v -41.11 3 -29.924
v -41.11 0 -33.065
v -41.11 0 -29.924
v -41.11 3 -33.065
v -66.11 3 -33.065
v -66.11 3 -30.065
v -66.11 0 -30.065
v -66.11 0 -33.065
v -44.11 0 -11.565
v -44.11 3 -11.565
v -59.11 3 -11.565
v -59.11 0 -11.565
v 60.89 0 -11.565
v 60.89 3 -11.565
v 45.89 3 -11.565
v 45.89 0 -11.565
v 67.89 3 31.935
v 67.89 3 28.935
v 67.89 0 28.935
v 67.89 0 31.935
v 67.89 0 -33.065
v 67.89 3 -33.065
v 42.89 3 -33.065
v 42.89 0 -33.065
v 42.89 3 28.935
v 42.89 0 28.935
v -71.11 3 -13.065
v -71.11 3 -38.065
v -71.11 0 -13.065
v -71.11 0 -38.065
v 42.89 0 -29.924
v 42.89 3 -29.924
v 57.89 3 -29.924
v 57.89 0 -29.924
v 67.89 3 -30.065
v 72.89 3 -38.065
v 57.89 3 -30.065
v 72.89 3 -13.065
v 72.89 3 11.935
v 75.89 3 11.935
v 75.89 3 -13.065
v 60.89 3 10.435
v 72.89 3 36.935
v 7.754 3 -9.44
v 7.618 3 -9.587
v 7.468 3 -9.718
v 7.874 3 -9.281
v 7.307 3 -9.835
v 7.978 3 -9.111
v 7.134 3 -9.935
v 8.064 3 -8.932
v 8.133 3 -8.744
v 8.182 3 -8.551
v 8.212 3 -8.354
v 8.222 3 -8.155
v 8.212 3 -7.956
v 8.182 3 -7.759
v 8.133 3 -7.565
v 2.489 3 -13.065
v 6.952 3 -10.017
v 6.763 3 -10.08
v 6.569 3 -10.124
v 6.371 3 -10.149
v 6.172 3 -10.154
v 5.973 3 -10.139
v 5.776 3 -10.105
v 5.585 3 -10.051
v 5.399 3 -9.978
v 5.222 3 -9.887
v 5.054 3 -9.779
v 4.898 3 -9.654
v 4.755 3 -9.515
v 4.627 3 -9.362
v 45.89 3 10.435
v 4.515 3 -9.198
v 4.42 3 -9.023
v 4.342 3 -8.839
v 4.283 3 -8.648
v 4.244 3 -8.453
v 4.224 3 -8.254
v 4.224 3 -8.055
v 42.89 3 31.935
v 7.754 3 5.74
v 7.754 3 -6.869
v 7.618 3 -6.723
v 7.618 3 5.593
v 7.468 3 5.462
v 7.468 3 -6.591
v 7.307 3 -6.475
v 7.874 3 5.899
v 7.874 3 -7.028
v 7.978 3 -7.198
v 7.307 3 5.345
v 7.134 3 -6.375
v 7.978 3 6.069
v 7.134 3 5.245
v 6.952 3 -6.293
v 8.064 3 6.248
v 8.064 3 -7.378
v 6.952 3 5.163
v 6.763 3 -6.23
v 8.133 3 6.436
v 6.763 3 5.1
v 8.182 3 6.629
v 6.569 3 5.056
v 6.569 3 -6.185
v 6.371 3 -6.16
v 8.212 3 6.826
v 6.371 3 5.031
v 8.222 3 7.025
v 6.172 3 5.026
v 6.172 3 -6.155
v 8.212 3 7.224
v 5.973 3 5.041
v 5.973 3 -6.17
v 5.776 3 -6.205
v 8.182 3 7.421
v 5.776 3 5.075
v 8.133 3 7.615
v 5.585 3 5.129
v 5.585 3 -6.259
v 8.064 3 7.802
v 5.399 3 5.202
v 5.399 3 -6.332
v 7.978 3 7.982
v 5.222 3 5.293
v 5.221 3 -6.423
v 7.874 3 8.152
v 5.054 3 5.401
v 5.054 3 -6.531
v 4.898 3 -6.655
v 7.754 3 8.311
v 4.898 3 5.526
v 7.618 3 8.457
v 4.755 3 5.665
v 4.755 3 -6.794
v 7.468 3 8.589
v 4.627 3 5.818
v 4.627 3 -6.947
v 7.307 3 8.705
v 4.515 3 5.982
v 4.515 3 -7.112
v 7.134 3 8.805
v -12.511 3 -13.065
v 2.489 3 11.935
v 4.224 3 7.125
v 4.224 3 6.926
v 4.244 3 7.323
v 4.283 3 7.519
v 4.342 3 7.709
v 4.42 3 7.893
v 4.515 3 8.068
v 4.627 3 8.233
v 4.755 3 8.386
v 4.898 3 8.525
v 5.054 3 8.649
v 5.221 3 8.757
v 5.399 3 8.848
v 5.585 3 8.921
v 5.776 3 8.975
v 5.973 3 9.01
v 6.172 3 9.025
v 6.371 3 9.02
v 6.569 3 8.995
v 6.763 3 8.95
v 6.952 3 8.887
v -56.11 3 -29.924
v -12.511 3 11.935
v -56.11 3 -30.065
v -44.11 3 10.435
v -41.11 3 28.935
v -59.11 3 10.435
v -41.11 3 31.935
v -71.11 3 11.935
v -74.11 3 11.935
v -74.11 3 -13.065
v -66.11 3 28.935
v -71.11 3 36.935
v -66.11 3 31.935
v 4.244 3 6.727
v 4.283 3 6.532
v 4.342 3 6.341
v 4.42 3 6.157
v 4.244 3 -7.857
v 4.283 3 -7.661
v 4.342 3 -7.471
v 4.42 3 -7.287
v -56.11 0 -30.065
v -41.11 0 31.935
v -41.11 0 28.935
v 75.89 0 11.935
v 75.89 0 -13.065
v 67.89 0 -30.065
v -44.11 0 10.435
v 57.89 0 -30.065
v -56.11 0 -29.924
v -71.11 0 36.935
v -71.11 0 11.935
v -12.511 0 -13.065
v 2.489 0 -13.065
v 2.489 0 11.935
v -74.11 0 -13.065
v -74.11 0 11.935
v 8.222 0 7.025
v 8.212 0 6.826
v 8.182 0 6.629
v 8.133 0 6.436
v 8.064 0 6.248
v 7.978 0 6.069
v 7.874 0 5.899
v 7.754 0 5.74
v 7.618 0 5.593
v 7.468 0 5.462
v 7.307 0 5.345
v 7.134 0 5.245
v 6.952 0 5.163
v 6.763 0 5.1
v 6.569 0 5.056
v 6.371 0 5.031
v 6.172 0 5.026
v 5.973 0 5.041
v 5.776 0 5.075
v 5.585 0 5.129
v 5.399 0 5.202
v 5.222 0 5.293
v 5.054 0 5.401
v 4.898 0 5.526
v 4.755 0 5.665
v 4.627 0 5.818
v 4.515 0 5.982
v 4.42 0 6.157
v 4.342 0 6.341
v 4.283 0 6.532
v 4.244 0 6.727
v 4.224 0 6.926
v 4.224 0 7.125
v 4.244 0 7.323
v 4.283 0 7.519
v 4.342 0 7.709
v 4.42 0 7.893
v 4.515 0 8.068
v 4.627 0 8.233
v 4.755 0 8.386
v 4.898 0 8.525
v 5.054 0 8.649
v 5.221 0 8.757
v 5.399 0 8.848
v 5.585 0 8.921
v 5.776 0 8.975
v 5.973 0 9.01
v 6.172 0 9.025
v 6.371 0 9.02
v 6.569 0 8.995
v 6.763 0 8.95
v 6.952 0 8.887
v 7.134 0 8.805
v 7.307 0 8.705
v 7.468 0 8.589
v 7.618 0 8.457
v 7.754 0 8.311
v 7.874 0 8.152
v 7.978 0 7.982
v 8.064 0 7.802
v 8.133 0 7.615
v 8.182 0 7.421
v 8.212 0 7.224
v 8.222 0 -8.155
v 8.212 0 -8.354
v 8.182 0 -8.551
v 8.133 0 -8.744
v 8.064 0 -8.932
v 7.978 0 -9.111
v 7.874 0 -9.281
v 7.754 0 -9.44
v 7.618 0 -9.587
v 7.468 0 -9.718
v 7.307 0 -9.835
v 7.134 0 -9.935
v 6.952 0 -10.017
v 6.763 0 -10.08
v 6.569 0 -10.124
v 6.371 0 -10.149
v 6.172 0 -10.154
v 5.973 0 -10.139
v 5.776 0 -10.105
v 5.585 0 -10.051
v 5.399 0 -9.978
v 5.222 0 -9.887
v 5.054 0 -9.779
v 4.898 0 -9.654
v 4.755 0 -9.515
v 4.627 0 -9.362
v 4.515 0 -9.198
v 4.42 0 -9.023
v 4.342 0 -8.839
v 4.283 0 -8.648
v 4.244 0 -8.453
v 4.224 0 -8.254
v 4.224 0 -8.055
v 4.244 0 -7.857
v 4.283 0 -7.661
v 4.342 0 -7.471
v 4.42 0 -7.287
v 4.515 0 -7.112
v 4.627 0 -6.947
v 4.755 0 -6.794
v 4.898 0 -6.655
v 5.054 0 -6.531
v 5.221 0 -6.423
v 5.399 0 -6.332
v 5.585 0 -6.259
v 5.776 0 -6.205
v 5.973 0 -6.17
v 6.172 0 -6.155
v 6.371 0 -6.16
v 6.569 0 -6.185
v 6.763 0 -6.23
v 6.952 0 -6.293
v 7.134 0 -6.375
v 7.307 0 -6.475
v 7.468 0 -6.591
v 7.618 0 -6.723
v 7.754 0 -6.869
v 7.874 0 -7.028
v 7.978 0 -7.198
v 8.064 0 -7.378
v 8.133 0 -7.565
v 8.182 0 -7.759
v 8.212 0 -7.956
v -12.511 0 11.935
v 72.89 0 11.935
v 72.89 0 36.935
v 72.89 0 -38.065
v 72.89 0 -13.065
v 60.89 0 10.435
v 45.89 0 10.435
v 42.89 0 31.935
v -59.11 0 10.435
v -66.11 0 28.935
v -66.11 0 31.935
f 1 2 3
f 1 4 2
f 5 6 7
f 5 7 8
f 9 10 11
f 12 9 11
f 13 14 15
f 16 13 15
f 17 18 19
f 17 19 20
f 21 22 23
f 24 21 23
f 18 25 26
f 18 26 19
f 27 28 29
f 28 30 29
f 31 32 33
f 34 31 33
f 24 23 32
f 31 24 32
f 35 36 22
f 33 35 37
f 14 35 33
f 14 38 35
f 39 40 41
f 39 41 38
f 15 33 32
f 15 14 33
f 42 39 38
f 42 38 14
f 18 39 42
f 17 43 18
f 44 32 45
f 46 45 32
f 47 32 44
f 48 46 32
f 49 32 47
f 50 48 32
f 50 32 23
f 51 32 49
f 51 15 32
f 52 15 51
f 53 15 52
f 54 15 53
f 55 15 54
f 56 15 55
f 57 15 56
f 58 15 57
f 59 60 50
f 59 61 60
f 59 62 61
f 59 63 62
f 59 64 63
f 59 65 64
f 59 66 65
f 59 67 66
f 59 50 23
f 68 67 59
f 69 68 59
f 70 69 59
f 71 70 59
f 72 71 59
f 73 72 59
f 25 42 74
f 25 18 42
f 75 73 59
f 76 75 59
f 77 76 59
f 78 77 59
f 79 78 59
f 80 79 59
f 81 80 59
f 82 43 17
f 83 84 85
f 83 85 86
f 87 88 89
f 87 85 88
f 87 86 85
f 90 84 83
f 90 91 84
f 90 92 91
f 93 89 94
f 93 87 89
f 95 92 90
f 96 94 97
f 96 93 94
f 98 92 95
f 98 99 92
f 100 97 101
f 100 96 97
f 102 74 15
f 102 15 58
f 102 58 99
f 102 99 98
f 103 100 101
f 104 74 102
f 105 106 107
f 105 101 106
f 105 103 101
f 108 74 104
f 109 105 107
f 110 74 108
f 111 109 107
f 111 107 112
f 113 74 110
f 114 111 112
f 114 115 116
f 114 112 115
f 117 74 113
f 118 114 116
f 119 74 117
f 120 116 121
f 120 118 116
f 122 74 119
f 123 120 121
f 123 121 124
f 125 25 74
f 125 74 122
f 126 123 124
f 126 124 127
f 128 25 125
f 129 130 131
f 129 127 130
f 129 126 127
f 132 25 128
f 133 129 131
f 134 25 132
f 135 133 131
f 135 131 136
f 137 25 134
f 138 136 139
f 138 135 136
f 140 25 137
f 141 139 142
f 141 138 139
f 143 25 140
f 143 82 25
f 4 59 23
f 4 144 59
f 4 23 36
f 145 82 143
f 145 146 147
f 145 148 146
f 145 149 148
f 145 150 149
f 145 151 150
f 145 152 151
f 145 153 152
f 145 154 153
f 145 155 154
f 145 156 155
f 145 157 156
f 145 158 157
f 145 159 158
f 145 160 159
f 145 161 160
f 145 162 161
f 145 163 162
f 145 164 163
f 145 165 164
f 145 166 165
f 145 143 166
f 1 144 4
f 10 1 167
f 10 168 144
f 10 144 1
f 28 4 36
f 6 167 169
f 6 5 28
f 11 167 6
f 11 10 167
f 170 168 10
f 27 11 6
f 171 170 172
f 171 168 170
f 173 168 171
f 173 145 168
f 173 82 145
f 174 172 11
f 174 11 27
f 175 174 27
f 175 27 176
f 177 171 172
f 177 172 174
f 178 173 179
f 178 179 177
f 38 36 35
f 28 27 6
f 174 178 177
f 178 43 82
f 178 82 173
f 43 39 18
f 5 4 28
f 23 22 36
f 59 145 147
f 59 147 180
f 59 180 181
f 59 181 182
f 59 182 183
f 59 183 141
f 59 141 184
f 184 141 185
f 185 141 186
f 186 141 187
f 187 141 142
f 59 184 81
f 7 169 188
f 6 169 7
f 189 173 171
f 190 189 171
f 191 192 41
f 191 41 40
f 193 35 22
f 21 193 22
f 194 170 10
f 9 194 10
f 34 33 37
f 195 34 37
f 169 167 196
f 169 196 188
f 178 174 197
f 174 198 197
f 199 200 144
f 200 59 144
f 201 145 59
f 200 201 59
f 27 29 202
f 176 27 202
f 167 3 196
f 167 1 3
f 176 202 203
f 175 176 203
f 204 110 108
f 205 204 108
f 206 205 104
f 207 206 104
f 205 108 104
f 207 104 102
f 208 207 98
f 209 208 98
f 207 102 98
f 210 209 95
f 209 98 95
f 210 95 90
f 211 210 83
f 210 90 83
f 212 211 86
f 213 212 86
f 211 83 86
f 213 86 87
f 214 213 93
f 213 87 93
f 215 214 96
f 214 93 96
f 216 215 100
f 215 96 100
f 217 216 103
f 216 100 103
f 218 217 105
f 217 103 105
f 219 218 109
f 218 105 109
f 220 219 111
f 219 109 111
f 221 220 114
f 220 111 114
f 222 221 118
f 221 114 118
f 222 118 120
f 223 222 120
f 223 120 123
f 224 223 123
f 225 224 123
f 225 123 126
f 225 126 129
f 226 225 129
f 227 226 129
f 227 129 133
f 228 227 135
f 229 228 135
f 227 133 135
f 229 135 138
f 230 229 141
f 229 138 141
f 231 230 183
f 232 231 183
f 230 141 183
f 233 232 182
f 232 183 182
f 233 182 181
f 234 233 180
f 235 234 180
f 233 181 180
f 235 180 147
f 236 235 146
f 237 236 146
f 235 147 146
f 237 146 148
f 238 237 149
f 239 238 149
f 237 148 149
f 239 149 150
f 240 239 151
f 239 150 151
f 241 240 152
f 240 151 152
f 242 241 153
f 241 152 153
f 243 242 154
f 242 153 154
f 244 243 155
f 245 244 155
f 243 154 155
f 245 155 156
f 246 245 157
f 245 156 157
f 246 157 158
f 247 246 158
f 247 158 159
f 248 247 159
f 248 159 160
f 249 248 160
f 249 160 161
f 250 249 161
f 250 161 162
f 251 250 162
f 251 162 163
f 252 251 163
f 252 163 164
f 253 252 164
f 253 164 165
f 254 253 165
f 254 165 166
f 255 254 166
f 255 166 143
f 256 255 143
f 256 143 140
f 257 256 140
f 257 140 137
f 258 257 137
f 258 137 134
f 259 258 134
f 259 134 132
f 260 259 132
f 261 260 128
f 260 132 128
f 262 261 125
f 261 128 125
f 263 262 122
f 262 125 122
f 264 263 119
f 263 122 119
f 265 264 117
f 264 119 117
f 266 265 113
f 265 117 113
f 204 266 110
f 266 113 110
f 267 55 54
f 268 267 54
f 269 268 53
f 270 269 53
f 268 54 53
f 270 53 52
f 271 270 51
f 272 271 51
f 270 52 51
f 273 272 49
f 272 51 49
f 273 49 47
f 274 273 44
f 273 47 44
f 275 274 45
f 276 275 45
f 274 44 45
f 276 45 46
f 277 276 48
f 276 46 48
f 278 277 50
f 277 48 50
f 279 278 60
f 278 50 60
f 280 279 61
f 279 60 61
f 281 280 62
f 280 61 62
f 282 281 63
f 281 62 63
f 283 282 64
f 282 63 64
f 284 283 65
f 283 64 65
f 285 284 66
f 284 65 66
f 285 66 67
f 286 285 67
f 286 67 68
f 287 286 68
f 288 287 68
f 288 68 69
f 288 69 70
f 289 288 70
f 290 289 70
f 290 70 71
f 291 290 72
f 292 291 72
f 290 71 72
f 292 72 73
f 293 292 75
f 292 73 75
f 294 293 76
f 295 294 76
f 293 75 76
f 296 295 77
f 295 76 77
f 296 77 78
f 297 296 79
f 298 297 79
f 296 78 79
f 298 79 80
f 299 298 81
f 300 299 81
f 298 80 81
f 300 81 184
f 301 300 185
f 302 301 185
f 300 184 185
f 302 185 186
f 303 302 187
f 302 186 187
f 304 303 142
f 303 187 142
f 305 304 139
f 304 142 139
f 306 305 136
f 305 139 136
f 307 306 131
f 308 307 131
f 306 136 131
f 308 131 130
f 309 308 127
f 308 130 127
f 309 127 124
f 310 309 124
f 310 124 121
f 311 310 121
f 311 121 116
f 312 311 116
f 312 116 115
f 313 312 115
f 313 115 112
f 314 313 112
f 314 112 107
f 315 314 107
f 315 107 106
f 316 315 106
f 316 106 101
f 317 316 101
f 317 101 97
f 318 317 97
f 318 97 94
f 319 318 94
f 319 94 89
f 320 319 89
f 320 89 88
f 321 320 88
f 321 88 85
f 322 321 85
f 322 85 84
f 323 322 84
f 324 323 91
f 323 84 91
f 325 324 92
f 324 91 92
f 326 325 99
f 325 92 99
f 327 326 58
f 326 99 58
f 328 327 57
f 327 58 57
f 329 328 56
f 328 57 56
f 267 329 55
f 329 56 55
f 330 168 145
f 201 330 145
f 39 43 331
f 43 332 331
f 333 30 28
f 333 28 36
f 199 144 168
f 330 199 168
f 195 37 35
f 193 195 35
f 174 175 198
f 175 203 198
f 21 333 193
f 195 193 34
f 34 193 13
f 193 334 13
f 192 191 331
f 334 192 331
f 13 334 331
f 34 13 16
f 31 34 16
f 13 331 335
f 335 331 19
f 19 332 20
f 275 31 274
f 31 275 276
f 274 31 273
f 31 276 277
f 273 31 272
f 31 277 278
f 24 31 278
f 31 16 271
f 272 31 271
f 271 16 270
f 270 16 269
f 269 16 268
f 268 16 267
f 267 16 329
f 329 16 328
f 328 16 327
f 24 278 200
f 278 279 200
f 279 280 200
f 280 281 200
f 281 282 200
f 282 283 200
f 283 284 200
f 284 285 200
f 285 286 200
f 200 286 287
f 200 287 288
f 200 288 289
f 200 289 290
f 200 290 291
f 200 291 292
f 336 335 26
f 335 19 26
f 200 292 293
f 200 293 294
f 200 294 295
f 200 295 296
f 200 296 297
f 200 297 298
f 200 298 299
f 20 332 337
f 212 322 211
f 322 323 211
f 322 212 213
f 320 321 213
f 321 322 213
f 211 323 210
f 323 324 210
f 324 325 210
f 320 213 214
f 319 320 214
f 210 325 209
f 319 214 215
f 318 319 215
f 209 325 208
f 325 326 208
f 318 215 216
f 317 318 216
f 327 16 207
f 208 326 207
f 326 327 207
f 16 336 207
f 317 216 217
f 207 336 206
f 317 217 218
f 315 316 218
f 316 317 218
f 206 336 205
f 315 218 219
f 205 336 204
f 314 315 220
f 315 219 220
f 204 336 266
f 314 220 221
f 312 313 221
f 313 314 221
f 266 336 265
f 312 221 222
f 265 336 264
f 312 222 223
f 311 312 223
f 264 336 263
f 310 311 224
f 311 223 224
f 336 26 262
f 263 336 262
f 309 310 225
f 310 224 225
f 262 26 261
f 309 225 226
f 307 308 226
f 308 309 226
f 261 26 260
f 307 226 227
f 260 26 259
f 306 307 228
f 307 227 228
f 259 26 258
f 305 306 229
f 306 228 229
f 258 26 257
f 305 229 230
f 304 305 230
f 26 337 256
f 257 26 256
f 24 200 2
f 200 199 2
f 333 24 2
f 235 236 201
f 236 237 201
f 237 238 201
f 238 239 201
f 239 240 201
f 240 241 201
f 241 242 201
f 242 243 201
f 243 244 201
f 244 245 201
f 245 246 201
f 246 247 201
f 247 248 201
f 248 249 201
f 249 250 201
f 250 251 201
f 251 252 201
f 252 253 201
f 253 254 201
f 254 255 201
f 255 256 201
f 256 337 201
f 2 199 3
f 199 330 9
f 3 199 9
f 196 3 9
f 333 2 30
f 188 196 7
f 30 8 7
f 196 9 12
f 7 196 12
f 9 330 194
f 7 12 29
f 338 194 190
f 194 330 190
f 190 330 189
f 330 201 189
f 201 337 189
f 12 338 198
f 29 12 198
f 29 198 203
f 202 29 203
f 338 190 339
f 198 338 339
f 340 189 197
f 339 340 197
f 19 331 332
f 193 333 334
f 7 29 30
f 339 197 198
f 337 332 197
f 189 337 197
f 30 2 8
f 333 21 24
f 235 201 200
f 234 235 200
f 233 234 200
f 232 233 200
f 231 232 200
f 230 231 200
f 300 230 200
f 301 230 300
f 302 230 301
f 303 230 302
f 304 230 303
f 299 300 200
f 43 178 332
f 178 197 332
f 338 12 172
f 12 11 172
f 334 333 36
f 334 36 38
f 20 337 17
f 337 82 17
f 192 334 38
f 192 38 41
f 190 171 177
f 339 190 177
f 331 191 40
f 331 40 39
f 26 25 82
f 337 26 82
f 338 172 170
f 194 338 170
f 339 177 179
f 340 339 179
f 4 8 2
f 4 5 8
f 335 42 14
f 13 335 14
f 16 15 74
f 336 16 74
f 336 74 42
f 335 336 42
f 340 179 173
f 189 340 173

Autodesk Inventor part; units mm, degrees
ref_plane "YZ Plane" through (0, 0, 0) normal (1, 0, 0) x (0, 1, 0)
ref_plane "XZ Plane" through (0, 0, 0) normal (0, 1, 0) x (-1, 0, 0)
ref_plane "XY Plane" through (0, 0, 0) normal (0, 0, 1) x (1, 0, 0)
sketch "Sketch1" plane through (0, 0, 0) normal (0, 1, 0) x (-1, 0, 0)
  line L0 (71.1097, -38.0648) -> (71.1097, -13.0648)
  line L1 (71.1097, -13.0648) -> (74.1097, -13.0648)
  line L2 (74.1097, -13.0648) -> (74.1097, 11.9352)
  line L3 (74.1097, 11.9352) -> (71.1097, 11.9352)
  line L4 (71.1097, 11.9352) -> (71.1097, 36.9352)
  line L5 (-72.8903, -38.0648) -> (-72.8903, -13.0648)
  line L6 (-72.8903, 36.9352) -> (-72.8903, 11.9352)
  line L7 (-72.8903, -13.0648) -> (-75.8903, -13.0648)
  line L8 (-75.8903, -13.0648) -> (-75.8903, 11.9352)
  line L9 (-75.8903, 11.9352) -> (-72.8903, 11.9352)
  line L10 (71.1097, -38.0648) -> (-72.8903, -38.0648)
  line L11 (71.1097, 36.9352) -> (-72.8903, 36.9352)
  point P0 (0, 0)
extrude "Extrusion1" add sketch "Sketch1" along normal blind 3
sketch "Sketch2" plane through (0, 3, 0) normal (0, 1, 0) x (1, 0, 0)
  line L0 (-71.1097, -36.9352) -> (72.8903, -36.9352) projected
  line L1 (-66.1097, -31.9352) -> (-56.1097, -31.9352)
  line L2 (-56.1097, -31.9352) -> (-56.1097, -28.9352)
  line L3 (-56.1097, -28.9352) -> (-66.1097, -28.9352)
  line L4 (-66.1097, -28.9352) -> (-66.1097, -31.9352)
  line L5 (72.8903, 38.0648) -> (-71.1097, 38.0648) projected
  line L6 (-56.1097, 30.0648) -> (-66.1097, 30.0648)
  line L7 (-66.1097, 30.0648) -> (-66.1097, 33.0648)
  line L8 (-66.1097, 33.0648) -> (-56.1097, 33.0648)
  line L9 (-56.1097, 33.0648) -> (-56.1097, 30.0648)
  line L10 (67.8903, 33.0648) -> (57.8903, 33.0648)
  line L11 (57.8903, 33.0648) -> (57.8903, 30.0648)
  line L12 (57.8903, 30.0648) -> (67.8903, 30.0648)
  line L13 (67.8903, 30.0648) -> (67.8903, 33.0648)
  line L14 (67.8903, -31.9352) -> (57.8903, -31.9352)
  line L15 (57.8903, -31.9352) -> (57.8903, -28.9352)
  line L16 (57.8903, -28.9352) -> (67.8903, -28.9352)
  line L17 (67.8903, -28.9352) -> (67.8903, -31.9352)
  point P0 (0, 0)
extrude "Extrusion2" cut sketch "Sketch2" against normal blind 30
sketch "Sketch3" plane through (0, 3, 0) normal (0, 1, 0) x (1, 0, 0)
  line L0 (72.8903, 38.0648) -> (-71.1097, 38.0648) projected
  line L1 (-71.1097, -36.9352) -> (72.8903, -36.9352) projected
  line L2 (-74.1097, 13.0648) -> (-74.1097, -11.9352) projected
  line L3 (75.8903, -11.9352) -> (75.8903, 13.0648) projected
  circle A0 centre (6.2215, -7.0252) radius 2
  circle A1 centre (6.2215, 8.1548) radius 2
  line L4 (2.4888, 13.0648) -> (-12.5112, 13.0648)
  line L5 (-12.5112, 13.0648) -> (-12.5112, -11.9352)
  line L6 (-12.5112, -11.9352) -> (2.4888, -11.9352)
  line L7 (2.4888, -11.9352) -> (2.4888, 13.0648)
  line L8 (-59.1097, -10.4352) -> (-44.1097, -10.4352)
  line L9 (-44.1097, -10.4352) -> (-44.1097, 11.5648)
  line L10 (-44.1097, 11.5648) -> (-59.1097, 11.5648)
  line L11 (-59.1097, 11.5648) -> (-59.1097, -10.4352)
  line L12 (60.8903, 11.5648) -> (45.8903, 11.5648)
  line L13 (45.8903, 11.5648) -> (45.8903, -10.4352)
  line L14 (45.8903, -10.4352) -> (60.8903, -10.4352)
  line L15 (60.8903, -10.4352) -> (60.8903, 11.5648)
  point P0 (0, 0)
  dimension "d56" = 15
  dimension "d57" = 22
  dimension "d59" = 25
  dimension "d60" = 15
  dimension "d61" = 4
  dimension "d62" = 4
  dimension "d63" = 15
  dimension "d64" = 22
extrude "Extrusion3" cut sketch "Sketch3" against normal blind 10
sketch "Sketch4" plane through (0, 3, 0) normal (0, 1, 0) x (1, 0, 0)
  line L0 (-56.1097, 33.0648) -> (-41.1097, 33.0648)
  line L1 (-41.1097, 33.0648) -> (-41.1097, 29.924)
  line L2 (-41.1097, 29.924) -> (-56.1097, 29.924)
  line L3 (-56.1097, 29.924) -> (-56.1097, 33.0648)
  line L4 (57.8903, 30.0648) -> (57.8903, 33.0648) projected
  line L5 (57.8903, 33.0648) -> (42.8903, 33.0648)
  line L6 (42.8903, 33.0648) -> (42.8903, 29.924)
  line L7 (42.8903, 29.924) -> (57.8903, 29.924)
  line L8 (57.8903, 29.924) -> (57.8903, 33.0648)
  line L9 (-56.1097, -31.9352) -> (-41.1097, -31.9352)
  line L10 (-41.1097, -31.9352) -> (-41.1097, -28.9352)
  line L11 (-41.1097, -28.9352) -> (-56.1097, -28.9352)
  line L12 (-56.1097, -28.9352) -> (-56.1097, -31.9352)
  line L13 (57.8903, -31.9352) -> (57.8903, -28.9352) projected
  line L14 (57.8903, -28.9352) -> (42.8903, -28.9352)
  line L15 (42.8903, -28.9352) -> (42.8903, -31.9352)
  line L16 (42.8903, -31.9352) -> (57.8903, -31.9352)
  line L17 (57.8903, -31.9352) -> (57.8903, -28.9352)
  point P0 (0, 0)
  dimension "d67" = 15
  dimension "d68" = 15
extrude "Extrusion4" cut sketch "Sketch4" against normal blind 10
properties part number "Level4 (Sensor + Schakelaar)"
